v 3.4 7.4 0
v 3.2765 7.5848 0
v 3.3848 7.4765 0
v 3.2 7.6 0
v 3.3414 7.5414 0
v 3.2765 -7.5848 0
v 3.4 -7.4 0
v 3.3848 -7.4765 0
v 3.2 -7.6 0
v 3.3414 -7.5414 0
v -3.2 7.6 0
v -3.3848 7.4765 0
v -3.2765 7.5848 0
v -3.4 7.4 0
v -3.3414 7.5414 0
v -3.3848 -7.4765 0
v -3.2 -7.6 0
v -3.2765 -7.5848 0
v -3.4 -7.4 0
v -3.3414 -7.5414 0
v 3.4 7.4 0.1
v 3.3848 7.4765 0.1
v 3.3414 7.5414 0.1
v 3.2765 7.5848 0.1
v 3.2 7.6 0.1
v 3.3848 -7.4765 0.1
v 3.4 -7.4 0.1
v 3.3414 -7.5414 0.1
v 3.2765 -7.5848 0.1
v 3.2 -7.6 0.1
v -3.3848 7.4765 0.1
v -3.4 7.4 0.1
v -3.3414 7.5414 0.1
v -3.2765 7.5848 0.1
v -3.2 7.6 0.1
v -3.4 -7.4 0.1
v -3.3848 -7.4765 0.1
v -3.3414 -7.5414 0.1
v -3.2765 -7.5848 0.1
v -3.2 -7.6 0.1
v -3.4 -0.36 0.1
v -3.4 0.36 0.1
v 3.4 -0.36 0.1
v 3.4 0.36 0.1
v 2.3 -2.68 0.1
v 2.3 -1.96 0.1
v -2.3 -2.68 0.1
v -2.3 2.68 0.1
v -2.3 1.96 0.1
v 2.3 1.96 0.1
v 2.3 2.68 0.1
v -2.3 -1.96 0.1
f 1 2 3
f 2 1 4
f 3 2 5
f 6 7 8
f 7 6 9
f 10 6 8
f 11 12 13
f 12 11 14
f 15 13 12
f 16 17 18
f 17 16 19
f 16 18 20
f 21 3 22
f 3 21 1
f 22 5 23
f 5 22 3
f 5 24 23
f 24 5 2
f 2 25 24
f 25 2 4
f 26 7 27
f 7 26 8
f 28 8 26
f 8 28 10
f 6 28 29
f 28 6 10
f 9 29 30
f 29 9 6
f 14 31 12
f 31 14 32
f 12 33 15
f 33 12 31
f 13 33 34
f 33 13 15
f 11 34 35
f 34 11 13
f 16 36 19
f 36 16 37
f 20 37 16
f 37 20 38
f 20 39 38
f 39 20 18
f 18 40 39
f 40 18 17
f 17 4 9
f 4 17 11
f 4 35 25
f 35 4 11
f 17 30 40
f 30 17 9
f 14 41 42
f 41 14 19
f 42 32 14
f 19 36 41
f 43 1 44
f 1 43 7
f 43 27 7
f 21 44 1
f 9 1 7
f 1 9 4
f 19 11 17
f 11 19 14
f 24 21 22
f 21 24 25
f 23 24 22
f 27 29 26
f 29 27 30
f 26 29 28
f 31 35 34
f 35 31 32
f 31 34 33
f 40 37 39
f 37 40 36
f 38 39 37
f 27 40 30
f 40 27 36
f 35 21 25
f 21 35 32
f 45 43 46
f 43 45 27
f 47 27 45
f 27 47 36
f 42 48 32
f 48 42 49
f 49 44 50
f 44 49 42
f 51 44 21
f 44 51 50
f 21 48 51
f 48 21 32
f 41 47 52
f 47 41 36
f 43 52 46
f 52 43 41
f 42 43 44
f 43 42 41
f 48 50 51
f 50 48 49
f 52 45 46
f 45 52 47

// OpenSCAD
// file: ../p/box3u12.scad
use <../lib.scad>
function ldraw_lib__box3u12() = [
// 0 Box with 3 Parallel Faces without Any Edges
// 0 Name: box3u12.dat
// 0 Author: J.C. Tchang [tchang]
// 0 !LDRAW_ORG Primitive UPDATE 2014-02
// 0 !LICENSE Licensed under CC BY 4.0 : see CAreadme.txt
// 
// 0 BFC CERTIFY CCW
  [0,"BFC","CERTIFY"],
  [0,"BFC","CCW"],
// 
// 0 !HISTORY 2014-12-23 [PTadmin] Official Update 2014-02
// 
// 
// 4 16 -1 1 1 1 1 1 1 1 -1 -1 1 -1
  [4,16,-1,1,1,1,1,1,1,1,-1,-1,1,-1],
// 4 16 -1 1 1 -1 0 1 1 0 1 1 1 1
  [4,16,-1,1,1,-1,0,1,1,0,1,1,1,1],
// 4 16 1 1 -1 1 0 -1 -1 0 -1 -1 1 -1
  [4,16,1,1,-1,1,0,-1,-1,0,-1,-1,1,-1],
];
module ldraw_lib__box3u12(step=0, col=false, unit=2/5, alt=false, line=0.2, solid=!$preview)
    makepoly(ldraw_lib__box3u12(), step=step, col=col, unit=unit, alt=alt, line=line, solid=solid);
ldraw_lib__box3u12(line=0.2);
// file: ../p/1-4cyli.scad
use <../lib.scad>
function ldraw_lib__1_4cyli() = [
// 0 Cylinder 0.25
// 0 Name: 1-4cyli.dat
// 0 Author: James Jessiman
// 0 !LDRAW_ORG Primitive UPDATE 2012-01
// 0 !LICENSE Licensed under CC BY 4.0 : see CAreadme.txt
// 
// 0 BFC CERTIFY CCW
  [0,"BFC","CERTIFY"],
  [0,"BFC","CCW"],
// 
// 0 !HISTORY 2002-03-23 [sbliss] Added BFC statement.
// 0 !HISTORY 2002-04-25 [PTadmin] Official Update 2002-02
// 0 !HISTORY 2007-06-22 [PTadmin] Header formatted for Contributor Agreement
// 0 !HISTORY 2008-07-01 [PTadmin] Official Update 2008-01
// 0 !HISTORY 2012-02-16 [Philo] Changed to CCW
// 0 !HISTORY 2012-03-30 [PTadmin] Official Update 2012-01
// 
// 
// 4 16 1 1 0 0.9239 1 0.3827 0.9239 0 0.3827 1 0 0
  [4,16,1,1,0,0.9239,1,0.3827,0.9239,0,0.3827,1,0,0],
// 5 24 1 0 0 1 1 0 0.9239 0 0.3827 1 0 -1
  [5,24,1,0,0,1,1,0,0.9239,0,0.3827,1,0,-1],
// 4 16 0.9239 1 0.3827 0.7071 1 0.7071 0.7071 0 0.7071 0.9239 0 0.3827
  [4,16,0.9239,1,0.3827,0.7071,1,0.7071,0.7071,0,0.7071,0.9239,0,0.3827],
// 5 24 0.9239 0 0.3827 0.9239 1 0.3827 0.7071 0 0.7071 1 0 0
  [5,24,0.9239,0,0.3827,0.9239,1,0.3827,0.7071,0,0.7071,1,0,0],
// 4 16 0.7071 1 0.7071 0.3827 1 0.9239 0.3827 0 0.9239 0.7071 0 0.7071
  [4,16,0.7071,1,0.7071,0.3827,1,0.9239,0.3827,0,0.9239,0.7071,0,0.7071],
// 5 24 0.7071 0 0.7071 0.7071 1 0.7071 0.3827 0 0.9239 0.9239 0 0.3827
  [5,24,0.7071,0,0.7071,0.7071,1,0.7071,0.3827,0,0.9239,0.9239,0,0.3827],
// 4 16 0.3827 1 0.9239 0 1 1 0 0 1 0.3827 0 0.9239
  [4,16,0.3827,1,0.9239,0,1,1,0,0,1,0.3827,0,0.9239],
// 5 24 0.3827 0 0.9239 0.3827 1 0.9239 0 0 1 0.7071 0 0.7071
  [5,24,0.3827,0,0.9239,0.3827,1,0.9239,0,0,1,0.7071,0,0.7071],
// 5 24 0 0 1 0 1 1 0.3827 0 0.9239 -1 0 1
  [5,24,0,0,1,0,1,1,0.3827,0,0.9239,-1,0,1],
];
module ldraw_lib__1_4cyli(step=0, col=false, unit=2/5, alt=false, line=0.2, solid=!$preview)
    makepoly(ldraw_lib__1_4cyli(), step=step, col=col, unit=unit, alt=alt, line=line, solid=solid);
ldraw_lib__1_4cyli(line=0.2);
// file: ../p/1-4chrd.scad
use <../lib.scad>
function ldraw_lib__1_4chrd() = [
// 0 Chord 0.25
// 0 Name: 1-4chrd.dat
// 0 Author: Max Martin Richter [MMR1988]
// 0 !LDRAW_ORG Primitive UPDATE 2023-05
// 0 !LICENSE Licensed under CC BY 4.0 : see CAreadme.txt
// 
// 0 BFC CERTIFY CCW
  [0,"BFC","CERTIFY"],
  [0,"BFC","CCW"],
// 
// 0 !HISTORY 2004-04-22 [PTadmin] Official Update 2004-02
// 0 !HISTORY 2007-10-09 [PTadmin] Header formatted for Contributor Agreement
// 0 !HISTORY 2008-07-01 [PTadmin] Official Update 2008-01
// 0 !HISTORY 2012-08-02 [MMR1988] Re-creation with PrimGen2 and Rectifier
// 0 !HISTORY 2012-08-09 [PTadmin] Official Update 2012-02
// 0 !HISTORY 2023-10-27 [OrionP] Change author to MMR1988 from hafhead
// 0 !HISTORY 2023-10-31 [OrionP] Official Update 2023-05
// 
// 4 16 0.9239 0 0.3827 0.3827 0 0.9239 0 0 1 1 0 0
  [4,16,0.9239,0,0.3827,0.3827,0,0.9239,0,0,1,1,0,0],
// 3 16 0.7071 0 0.7071 0.3827 0 0.9239 0.9239 0 0.3827
  [3,16,0.7071,0,0.7071,0.3827,0,0.9239,0.9239,0,0.3827],
];
module ldraw_lib__1_4chrd(step=0, col=false, unit=2/5, alt=false, line=0.2, solid=!$preview)
    makepoly(ldraw_lib__1_4chrd(), step=step, col=col, unit=unit, alt=alt, line=line, solid=solid);
ldraw_lib__1_4chrd(line=0.2);
// main file
use <../lib.scad>
use <../p/1-4chrd.scad>
use <../p/1-4cyli.scad>
use <../p/box3u12.scad>
function ldraw_lib__6451314h() = [
// 0 Sticker  1.9 x  0.9 with Red, Metallic Silver and Blue Stripes on White Background
// 0 Name: 6451314h.dat
// 0 Author: Vincent Messenet [Cheenzo]
// 0 !LDRAW_ORG Part UPDATE 2024-07
// 0 !LICENSE Licensed under CC BY 4.0 : see CAreadme.txt
// 
// 0 BFC CERTIFY CCW
  [0,"BFC","CERTIFY"],
  [0,"BFC","CCW"],
// 
// 0 !KEYWORDS Bricklink 10321stk01, Brickowl 1314396, Chevrolet, Corvette, Icons
// 0 !KEYWORDS Rebrickable 10104784, Set 10321
// 
// 0 !HISTORY 2024-08-26 [OrionP] Official Update 2024-07
// 
// 1 16 8 0 18.5 .5 0 0 0 -1 0 0 0 .5 1-4chrd.dat
  [1,16,8,0,18.5,.5,0,0,0,-1,0,0,0,.5, ldraw_lib__1_4chrd()],
// 1 16 8 0 -18.5 .5 0 0 0 -1 0 0 0 -.5 1-4chrd.dat
  [1,16,8,0,-18.5,.5,0,0,0,-1,0,0,0,-.5, ldraw_lib__1_4chrd()],
// 1 16 -8 0 18.5 -.5 0 0 0 -1 0 0 0 .5 1-4chrd.dat
  [1,16,-8,0,18.5,-.5,0,0,0,-1,0,0,0,.5, ldraw_lib__1_4chrd()],
// 1 16 -8 0 -18.5 -.5 0 0 0 -1 0 0 0 -.5 1-4chrd.dat
  [1,16,-8,0,-18.5,-.5,0,0,0,-1,0,0,0,-.5, ldraw_lib__1_4chrd()],
// 1 16 8 0 18.5 .5 0 0 0 -.25 0 0 0 .5 1-4cyli.dat
  [1,16,8,0,18.5,.5,0,0,0,-.25,0,0,0,.5, ldraw_lib__1_4cyli()],
// 1 16 8 0 -18.5 .5 0 0 0 -.25 0 0 0 -.5 1-4cyli.dat
  [1,16,8,0,-18.5,.5,0,0,0,-.25,0,0,0,-.5, ldraw_lib__1_4cyli()],
// 1 16 -8 0 18.5 -.5 0 0 0 -.25 0 0 0 .5 1-4cyli.dat
  [1,16,-8,0,18.5,-.5,0,0,0,-.25,0,0,0,.5, ldraw_lib__1_4cyli()],
// 1 16 -8 0 -18.5 -.5 0 0 0 -.25 0 0 0 -.5 1-4cyli.dat
  [1,16,-8,0,-18.5,-.5,0,0,0,-.25,0,0,0,-.5, ldraw_lib__1_4cyli()],
// 1 16 0 -.25 0 8 0 0 0 .25 0 0 0 19 box3u12.dat
  [1,16,0,-.25,0,8,0,0,0,.25,0,0,0,19, ldraw_lib__box3u12()],
// 4 16 -8.5 -.25 .9 -8.5 0 18.5 -8.5 0 -18.5 -8.5 -.25 -.9
  [4,16,-8.5,-.25,.9,-8.5,0,18.5,-8.5,0,-18.5,-8.5,-.25,-.9],
// 3 16 -8.5 -.25 .9 -8.5 -.25 18.5 -8.5 0 18.5
  [3,16,-8.5,-.25,.9,-8.5,-.25,18.5,-8.5,0,18.5],
// 3 16 -8.5 0 -18.5 -8.5 -.25 -18.5 -8.5 -.25 -.9
  [3,16,-8.5,0,-18.5,-8.5,-.25,-18.5,-8.5,-.25,-.9],
// 4 16 8.5 0 18.5 8.5 -.25 .9 8.5 -.25 -.9 8.5 0 -18.5
  [4,16,8.5,0,18.5,8.5,-.25,.9,8.5,-.25,-.9,8.5,0,-18.5],
// 3 16 8.5 -.25 -.9 8.5 -.25 -18.5 8.5 0 -18.5
  [3,16,8.5,-.25,-.9,8.5,-.25,-18.5,8.5,0,-18.5],
// 3 16 8.5 -.25 18.5 8.5 -.25 .9 8.5 0 18.5
  [3,16,8.5,-.25,18.5,8.5,-.25,.9,8.5,0,18.5],
// 4 16 8.5 0 18.5 8.5 0 -18.5 8 0 -19 8 0 19
  [4,16,8.5,0,18.5,8.5,0,-18.5,8,0,-19,8,0,19],
// 4 16 -8.5 0 18.5 -8 0 19 -8 0 -19 -8.5 0 -18.5
  [4,16,-8.5,0,18.5,-8,0,19,-8,0,-19,-8.5,0,-18.5],
// 
// 1 15 8 -.25 18.5 .5 0 0 0 1 0 0 0 .5 1-4chrd.dat
  [1,15,8,-.25,18.5,.5,0,0,0,1,0,0,0,.5, ldraw_lib__1_4chrd()],
// 1 15 8 -.25 -18.5 .5 0 0 0 1 0 0 0 -.5 1-4chrd.dat
  [1,15,8,-.25,-18.5,.5,0,0,0,1,0,0,0,-.5, ldraw_lib__1_4chrd()],
// 1 15 -8 -.25 18.5 -.5 0 0 0 1 0 0 0 .5 1-4chrd.dat
  [1,15,-8,-.25,18.5,-.5,0,0,0,1,0,0,0,.5, ldraw_lib__1_4chrd()],
// 1 15 -8 -.25 -18.5 -.5 0 0 0 1 0 0 0 -.5 1-4chrd.dat
  [1,15,-8,-.25,-18.5,-.5,0,0,0,1,0,0,0,-.5, ldraw_lib__1_4chrd()],
// 4 15 8 -.25 -19 8.5 -.25 -18.5 -8.5 -.25 -18.5 -8 -.25 -19
  [4,15,8,-.25,-19,8.5,-.25,-18.5,-8.5,-.25,-18.5,-8,-.25,-19],
// 4 15 -8.5 -.25 18.5 8.5 -.25 18.5 8 -.25 19 -8 -.25 19
  [4,15,-8.5,-.25,18.5,8.5,-.25,18.5,8,-.25,19,-8,-.25,19],
// 4 15 8.5 -.25 -18.5 8.5 -.25 -.9 5.75 -.25 -4.9 5.75 -.25 -6.7
  [4,15,8.5,-.25,-18.5,8.5,-.25,-.9,5.75,-.25,-4.9,5.75,-.25,-6.7],
// 4 15 -8.5 -.25 -18.5 8.5 -.25 -18.5 5.75 -.25 -6.7 -5.75 -.25 -6.7
  [4,15,-8.5,-.25,-18.5,8.5,-.25,-18.5,5.75,-.25,-6.7,-5.75,-.25,-6.7],
// 4 15 -5.75 -.25 4.9 -5.75 -.25 6.7 -8.5 -.25 18.5 -8.5 -.25 .9
  [4,15,-5.75,-.25,4.9,-5.75,-.25,6.7,-8.5,-.25,18.5,-8.5,-.25,.9],
// 4 15 5.75 -.25 4.9 -5.75 -.25 4.9 -8.5 -.25 .9 8.5 -.25 .9
  [4,15,5.75,-.25,4.9,-5.75,-.25,4.9,-8.5,-.25,.9,8.5,-.25,.9],
// 4 15 5.75 -.25 4.9 8.5 -.25 .9 8.5 -.25 18.5 5.75 -.25 6.7
  [4,15,5.75,-.25,4.9,8.5,-.25,.9,8.5,-.25,18.5,5.75,-.25,6.7],
// 4 15 5.75 -.25 6.7 8.5 -.25 18.5 -8.5 -.25 18.5 -5.75 -.25 6.7
  [4,15,5.75,-.25,6.7,8.5,-.25,18.5,-8.5,-.25,18.5,-5.75,-.25,6.7],
// 4 15 -8.5 -.25 -18.5 -5.75 -.25 -6.7 -5.75 -.25 -4.9 -8.5 -.25 -.9
  [4,15,-8.5,-.25,-18.5,-5.75,-.25,-6.7,-5.75,-.25,-4.9,-8.5,-.25,-.9],
// 4 15 -8.5 -.25 -.9 -5.75 -.25 -4.9 5.75 -.25 -4.9 8.5 -.25 -.9
  [4,15,-8.5,-.25,-.9,-5.75,-.25,-4.9,5.75,-.25,-4.9,8.5,-.25,-.9],
// 4 80 -8.5 -.25 -.9 8.5 -.25 -.9 8.5 -.25 .9 -8.5 -.25 .9
  [4,80,-8.5,-.25,-.9,8.5,-.25,-.9,8.5,-.25,.9,-8.5,-.25,.9],
// 4 4 5.75 -.25 6.7 -5.75 -.25 6.7 -5.75 -.25 4.9 5.75 -.25 4.9
  [4,4,5.75,-.25,6.7,-5.75,-.25,6.7,-5.75,-.25,4.9,5.75,-.25,4.9],
// 4 1 -5.75 -.25 -6.7 5.75 -.25 -6.7 5.75 -.25 -4.9 -5.75 -.25 -4.9
  [4,1,-5.75,-.25,-6.7,5.75,-.25,-6.7,5.75,-.25,-4.9,-5.75,-.25,-4.9],
];
module ldraw_lib__6451314h(step=0, col=false, unit=2/5, alt=false, line=0.2, solid=!$preview)
    makepoly(ldraw_lib__6451314h(), step=step, col=col, unit=unit, alt=alt, line=line, solid=solid);
ldraw_lib__6451314h(line=0.2);
